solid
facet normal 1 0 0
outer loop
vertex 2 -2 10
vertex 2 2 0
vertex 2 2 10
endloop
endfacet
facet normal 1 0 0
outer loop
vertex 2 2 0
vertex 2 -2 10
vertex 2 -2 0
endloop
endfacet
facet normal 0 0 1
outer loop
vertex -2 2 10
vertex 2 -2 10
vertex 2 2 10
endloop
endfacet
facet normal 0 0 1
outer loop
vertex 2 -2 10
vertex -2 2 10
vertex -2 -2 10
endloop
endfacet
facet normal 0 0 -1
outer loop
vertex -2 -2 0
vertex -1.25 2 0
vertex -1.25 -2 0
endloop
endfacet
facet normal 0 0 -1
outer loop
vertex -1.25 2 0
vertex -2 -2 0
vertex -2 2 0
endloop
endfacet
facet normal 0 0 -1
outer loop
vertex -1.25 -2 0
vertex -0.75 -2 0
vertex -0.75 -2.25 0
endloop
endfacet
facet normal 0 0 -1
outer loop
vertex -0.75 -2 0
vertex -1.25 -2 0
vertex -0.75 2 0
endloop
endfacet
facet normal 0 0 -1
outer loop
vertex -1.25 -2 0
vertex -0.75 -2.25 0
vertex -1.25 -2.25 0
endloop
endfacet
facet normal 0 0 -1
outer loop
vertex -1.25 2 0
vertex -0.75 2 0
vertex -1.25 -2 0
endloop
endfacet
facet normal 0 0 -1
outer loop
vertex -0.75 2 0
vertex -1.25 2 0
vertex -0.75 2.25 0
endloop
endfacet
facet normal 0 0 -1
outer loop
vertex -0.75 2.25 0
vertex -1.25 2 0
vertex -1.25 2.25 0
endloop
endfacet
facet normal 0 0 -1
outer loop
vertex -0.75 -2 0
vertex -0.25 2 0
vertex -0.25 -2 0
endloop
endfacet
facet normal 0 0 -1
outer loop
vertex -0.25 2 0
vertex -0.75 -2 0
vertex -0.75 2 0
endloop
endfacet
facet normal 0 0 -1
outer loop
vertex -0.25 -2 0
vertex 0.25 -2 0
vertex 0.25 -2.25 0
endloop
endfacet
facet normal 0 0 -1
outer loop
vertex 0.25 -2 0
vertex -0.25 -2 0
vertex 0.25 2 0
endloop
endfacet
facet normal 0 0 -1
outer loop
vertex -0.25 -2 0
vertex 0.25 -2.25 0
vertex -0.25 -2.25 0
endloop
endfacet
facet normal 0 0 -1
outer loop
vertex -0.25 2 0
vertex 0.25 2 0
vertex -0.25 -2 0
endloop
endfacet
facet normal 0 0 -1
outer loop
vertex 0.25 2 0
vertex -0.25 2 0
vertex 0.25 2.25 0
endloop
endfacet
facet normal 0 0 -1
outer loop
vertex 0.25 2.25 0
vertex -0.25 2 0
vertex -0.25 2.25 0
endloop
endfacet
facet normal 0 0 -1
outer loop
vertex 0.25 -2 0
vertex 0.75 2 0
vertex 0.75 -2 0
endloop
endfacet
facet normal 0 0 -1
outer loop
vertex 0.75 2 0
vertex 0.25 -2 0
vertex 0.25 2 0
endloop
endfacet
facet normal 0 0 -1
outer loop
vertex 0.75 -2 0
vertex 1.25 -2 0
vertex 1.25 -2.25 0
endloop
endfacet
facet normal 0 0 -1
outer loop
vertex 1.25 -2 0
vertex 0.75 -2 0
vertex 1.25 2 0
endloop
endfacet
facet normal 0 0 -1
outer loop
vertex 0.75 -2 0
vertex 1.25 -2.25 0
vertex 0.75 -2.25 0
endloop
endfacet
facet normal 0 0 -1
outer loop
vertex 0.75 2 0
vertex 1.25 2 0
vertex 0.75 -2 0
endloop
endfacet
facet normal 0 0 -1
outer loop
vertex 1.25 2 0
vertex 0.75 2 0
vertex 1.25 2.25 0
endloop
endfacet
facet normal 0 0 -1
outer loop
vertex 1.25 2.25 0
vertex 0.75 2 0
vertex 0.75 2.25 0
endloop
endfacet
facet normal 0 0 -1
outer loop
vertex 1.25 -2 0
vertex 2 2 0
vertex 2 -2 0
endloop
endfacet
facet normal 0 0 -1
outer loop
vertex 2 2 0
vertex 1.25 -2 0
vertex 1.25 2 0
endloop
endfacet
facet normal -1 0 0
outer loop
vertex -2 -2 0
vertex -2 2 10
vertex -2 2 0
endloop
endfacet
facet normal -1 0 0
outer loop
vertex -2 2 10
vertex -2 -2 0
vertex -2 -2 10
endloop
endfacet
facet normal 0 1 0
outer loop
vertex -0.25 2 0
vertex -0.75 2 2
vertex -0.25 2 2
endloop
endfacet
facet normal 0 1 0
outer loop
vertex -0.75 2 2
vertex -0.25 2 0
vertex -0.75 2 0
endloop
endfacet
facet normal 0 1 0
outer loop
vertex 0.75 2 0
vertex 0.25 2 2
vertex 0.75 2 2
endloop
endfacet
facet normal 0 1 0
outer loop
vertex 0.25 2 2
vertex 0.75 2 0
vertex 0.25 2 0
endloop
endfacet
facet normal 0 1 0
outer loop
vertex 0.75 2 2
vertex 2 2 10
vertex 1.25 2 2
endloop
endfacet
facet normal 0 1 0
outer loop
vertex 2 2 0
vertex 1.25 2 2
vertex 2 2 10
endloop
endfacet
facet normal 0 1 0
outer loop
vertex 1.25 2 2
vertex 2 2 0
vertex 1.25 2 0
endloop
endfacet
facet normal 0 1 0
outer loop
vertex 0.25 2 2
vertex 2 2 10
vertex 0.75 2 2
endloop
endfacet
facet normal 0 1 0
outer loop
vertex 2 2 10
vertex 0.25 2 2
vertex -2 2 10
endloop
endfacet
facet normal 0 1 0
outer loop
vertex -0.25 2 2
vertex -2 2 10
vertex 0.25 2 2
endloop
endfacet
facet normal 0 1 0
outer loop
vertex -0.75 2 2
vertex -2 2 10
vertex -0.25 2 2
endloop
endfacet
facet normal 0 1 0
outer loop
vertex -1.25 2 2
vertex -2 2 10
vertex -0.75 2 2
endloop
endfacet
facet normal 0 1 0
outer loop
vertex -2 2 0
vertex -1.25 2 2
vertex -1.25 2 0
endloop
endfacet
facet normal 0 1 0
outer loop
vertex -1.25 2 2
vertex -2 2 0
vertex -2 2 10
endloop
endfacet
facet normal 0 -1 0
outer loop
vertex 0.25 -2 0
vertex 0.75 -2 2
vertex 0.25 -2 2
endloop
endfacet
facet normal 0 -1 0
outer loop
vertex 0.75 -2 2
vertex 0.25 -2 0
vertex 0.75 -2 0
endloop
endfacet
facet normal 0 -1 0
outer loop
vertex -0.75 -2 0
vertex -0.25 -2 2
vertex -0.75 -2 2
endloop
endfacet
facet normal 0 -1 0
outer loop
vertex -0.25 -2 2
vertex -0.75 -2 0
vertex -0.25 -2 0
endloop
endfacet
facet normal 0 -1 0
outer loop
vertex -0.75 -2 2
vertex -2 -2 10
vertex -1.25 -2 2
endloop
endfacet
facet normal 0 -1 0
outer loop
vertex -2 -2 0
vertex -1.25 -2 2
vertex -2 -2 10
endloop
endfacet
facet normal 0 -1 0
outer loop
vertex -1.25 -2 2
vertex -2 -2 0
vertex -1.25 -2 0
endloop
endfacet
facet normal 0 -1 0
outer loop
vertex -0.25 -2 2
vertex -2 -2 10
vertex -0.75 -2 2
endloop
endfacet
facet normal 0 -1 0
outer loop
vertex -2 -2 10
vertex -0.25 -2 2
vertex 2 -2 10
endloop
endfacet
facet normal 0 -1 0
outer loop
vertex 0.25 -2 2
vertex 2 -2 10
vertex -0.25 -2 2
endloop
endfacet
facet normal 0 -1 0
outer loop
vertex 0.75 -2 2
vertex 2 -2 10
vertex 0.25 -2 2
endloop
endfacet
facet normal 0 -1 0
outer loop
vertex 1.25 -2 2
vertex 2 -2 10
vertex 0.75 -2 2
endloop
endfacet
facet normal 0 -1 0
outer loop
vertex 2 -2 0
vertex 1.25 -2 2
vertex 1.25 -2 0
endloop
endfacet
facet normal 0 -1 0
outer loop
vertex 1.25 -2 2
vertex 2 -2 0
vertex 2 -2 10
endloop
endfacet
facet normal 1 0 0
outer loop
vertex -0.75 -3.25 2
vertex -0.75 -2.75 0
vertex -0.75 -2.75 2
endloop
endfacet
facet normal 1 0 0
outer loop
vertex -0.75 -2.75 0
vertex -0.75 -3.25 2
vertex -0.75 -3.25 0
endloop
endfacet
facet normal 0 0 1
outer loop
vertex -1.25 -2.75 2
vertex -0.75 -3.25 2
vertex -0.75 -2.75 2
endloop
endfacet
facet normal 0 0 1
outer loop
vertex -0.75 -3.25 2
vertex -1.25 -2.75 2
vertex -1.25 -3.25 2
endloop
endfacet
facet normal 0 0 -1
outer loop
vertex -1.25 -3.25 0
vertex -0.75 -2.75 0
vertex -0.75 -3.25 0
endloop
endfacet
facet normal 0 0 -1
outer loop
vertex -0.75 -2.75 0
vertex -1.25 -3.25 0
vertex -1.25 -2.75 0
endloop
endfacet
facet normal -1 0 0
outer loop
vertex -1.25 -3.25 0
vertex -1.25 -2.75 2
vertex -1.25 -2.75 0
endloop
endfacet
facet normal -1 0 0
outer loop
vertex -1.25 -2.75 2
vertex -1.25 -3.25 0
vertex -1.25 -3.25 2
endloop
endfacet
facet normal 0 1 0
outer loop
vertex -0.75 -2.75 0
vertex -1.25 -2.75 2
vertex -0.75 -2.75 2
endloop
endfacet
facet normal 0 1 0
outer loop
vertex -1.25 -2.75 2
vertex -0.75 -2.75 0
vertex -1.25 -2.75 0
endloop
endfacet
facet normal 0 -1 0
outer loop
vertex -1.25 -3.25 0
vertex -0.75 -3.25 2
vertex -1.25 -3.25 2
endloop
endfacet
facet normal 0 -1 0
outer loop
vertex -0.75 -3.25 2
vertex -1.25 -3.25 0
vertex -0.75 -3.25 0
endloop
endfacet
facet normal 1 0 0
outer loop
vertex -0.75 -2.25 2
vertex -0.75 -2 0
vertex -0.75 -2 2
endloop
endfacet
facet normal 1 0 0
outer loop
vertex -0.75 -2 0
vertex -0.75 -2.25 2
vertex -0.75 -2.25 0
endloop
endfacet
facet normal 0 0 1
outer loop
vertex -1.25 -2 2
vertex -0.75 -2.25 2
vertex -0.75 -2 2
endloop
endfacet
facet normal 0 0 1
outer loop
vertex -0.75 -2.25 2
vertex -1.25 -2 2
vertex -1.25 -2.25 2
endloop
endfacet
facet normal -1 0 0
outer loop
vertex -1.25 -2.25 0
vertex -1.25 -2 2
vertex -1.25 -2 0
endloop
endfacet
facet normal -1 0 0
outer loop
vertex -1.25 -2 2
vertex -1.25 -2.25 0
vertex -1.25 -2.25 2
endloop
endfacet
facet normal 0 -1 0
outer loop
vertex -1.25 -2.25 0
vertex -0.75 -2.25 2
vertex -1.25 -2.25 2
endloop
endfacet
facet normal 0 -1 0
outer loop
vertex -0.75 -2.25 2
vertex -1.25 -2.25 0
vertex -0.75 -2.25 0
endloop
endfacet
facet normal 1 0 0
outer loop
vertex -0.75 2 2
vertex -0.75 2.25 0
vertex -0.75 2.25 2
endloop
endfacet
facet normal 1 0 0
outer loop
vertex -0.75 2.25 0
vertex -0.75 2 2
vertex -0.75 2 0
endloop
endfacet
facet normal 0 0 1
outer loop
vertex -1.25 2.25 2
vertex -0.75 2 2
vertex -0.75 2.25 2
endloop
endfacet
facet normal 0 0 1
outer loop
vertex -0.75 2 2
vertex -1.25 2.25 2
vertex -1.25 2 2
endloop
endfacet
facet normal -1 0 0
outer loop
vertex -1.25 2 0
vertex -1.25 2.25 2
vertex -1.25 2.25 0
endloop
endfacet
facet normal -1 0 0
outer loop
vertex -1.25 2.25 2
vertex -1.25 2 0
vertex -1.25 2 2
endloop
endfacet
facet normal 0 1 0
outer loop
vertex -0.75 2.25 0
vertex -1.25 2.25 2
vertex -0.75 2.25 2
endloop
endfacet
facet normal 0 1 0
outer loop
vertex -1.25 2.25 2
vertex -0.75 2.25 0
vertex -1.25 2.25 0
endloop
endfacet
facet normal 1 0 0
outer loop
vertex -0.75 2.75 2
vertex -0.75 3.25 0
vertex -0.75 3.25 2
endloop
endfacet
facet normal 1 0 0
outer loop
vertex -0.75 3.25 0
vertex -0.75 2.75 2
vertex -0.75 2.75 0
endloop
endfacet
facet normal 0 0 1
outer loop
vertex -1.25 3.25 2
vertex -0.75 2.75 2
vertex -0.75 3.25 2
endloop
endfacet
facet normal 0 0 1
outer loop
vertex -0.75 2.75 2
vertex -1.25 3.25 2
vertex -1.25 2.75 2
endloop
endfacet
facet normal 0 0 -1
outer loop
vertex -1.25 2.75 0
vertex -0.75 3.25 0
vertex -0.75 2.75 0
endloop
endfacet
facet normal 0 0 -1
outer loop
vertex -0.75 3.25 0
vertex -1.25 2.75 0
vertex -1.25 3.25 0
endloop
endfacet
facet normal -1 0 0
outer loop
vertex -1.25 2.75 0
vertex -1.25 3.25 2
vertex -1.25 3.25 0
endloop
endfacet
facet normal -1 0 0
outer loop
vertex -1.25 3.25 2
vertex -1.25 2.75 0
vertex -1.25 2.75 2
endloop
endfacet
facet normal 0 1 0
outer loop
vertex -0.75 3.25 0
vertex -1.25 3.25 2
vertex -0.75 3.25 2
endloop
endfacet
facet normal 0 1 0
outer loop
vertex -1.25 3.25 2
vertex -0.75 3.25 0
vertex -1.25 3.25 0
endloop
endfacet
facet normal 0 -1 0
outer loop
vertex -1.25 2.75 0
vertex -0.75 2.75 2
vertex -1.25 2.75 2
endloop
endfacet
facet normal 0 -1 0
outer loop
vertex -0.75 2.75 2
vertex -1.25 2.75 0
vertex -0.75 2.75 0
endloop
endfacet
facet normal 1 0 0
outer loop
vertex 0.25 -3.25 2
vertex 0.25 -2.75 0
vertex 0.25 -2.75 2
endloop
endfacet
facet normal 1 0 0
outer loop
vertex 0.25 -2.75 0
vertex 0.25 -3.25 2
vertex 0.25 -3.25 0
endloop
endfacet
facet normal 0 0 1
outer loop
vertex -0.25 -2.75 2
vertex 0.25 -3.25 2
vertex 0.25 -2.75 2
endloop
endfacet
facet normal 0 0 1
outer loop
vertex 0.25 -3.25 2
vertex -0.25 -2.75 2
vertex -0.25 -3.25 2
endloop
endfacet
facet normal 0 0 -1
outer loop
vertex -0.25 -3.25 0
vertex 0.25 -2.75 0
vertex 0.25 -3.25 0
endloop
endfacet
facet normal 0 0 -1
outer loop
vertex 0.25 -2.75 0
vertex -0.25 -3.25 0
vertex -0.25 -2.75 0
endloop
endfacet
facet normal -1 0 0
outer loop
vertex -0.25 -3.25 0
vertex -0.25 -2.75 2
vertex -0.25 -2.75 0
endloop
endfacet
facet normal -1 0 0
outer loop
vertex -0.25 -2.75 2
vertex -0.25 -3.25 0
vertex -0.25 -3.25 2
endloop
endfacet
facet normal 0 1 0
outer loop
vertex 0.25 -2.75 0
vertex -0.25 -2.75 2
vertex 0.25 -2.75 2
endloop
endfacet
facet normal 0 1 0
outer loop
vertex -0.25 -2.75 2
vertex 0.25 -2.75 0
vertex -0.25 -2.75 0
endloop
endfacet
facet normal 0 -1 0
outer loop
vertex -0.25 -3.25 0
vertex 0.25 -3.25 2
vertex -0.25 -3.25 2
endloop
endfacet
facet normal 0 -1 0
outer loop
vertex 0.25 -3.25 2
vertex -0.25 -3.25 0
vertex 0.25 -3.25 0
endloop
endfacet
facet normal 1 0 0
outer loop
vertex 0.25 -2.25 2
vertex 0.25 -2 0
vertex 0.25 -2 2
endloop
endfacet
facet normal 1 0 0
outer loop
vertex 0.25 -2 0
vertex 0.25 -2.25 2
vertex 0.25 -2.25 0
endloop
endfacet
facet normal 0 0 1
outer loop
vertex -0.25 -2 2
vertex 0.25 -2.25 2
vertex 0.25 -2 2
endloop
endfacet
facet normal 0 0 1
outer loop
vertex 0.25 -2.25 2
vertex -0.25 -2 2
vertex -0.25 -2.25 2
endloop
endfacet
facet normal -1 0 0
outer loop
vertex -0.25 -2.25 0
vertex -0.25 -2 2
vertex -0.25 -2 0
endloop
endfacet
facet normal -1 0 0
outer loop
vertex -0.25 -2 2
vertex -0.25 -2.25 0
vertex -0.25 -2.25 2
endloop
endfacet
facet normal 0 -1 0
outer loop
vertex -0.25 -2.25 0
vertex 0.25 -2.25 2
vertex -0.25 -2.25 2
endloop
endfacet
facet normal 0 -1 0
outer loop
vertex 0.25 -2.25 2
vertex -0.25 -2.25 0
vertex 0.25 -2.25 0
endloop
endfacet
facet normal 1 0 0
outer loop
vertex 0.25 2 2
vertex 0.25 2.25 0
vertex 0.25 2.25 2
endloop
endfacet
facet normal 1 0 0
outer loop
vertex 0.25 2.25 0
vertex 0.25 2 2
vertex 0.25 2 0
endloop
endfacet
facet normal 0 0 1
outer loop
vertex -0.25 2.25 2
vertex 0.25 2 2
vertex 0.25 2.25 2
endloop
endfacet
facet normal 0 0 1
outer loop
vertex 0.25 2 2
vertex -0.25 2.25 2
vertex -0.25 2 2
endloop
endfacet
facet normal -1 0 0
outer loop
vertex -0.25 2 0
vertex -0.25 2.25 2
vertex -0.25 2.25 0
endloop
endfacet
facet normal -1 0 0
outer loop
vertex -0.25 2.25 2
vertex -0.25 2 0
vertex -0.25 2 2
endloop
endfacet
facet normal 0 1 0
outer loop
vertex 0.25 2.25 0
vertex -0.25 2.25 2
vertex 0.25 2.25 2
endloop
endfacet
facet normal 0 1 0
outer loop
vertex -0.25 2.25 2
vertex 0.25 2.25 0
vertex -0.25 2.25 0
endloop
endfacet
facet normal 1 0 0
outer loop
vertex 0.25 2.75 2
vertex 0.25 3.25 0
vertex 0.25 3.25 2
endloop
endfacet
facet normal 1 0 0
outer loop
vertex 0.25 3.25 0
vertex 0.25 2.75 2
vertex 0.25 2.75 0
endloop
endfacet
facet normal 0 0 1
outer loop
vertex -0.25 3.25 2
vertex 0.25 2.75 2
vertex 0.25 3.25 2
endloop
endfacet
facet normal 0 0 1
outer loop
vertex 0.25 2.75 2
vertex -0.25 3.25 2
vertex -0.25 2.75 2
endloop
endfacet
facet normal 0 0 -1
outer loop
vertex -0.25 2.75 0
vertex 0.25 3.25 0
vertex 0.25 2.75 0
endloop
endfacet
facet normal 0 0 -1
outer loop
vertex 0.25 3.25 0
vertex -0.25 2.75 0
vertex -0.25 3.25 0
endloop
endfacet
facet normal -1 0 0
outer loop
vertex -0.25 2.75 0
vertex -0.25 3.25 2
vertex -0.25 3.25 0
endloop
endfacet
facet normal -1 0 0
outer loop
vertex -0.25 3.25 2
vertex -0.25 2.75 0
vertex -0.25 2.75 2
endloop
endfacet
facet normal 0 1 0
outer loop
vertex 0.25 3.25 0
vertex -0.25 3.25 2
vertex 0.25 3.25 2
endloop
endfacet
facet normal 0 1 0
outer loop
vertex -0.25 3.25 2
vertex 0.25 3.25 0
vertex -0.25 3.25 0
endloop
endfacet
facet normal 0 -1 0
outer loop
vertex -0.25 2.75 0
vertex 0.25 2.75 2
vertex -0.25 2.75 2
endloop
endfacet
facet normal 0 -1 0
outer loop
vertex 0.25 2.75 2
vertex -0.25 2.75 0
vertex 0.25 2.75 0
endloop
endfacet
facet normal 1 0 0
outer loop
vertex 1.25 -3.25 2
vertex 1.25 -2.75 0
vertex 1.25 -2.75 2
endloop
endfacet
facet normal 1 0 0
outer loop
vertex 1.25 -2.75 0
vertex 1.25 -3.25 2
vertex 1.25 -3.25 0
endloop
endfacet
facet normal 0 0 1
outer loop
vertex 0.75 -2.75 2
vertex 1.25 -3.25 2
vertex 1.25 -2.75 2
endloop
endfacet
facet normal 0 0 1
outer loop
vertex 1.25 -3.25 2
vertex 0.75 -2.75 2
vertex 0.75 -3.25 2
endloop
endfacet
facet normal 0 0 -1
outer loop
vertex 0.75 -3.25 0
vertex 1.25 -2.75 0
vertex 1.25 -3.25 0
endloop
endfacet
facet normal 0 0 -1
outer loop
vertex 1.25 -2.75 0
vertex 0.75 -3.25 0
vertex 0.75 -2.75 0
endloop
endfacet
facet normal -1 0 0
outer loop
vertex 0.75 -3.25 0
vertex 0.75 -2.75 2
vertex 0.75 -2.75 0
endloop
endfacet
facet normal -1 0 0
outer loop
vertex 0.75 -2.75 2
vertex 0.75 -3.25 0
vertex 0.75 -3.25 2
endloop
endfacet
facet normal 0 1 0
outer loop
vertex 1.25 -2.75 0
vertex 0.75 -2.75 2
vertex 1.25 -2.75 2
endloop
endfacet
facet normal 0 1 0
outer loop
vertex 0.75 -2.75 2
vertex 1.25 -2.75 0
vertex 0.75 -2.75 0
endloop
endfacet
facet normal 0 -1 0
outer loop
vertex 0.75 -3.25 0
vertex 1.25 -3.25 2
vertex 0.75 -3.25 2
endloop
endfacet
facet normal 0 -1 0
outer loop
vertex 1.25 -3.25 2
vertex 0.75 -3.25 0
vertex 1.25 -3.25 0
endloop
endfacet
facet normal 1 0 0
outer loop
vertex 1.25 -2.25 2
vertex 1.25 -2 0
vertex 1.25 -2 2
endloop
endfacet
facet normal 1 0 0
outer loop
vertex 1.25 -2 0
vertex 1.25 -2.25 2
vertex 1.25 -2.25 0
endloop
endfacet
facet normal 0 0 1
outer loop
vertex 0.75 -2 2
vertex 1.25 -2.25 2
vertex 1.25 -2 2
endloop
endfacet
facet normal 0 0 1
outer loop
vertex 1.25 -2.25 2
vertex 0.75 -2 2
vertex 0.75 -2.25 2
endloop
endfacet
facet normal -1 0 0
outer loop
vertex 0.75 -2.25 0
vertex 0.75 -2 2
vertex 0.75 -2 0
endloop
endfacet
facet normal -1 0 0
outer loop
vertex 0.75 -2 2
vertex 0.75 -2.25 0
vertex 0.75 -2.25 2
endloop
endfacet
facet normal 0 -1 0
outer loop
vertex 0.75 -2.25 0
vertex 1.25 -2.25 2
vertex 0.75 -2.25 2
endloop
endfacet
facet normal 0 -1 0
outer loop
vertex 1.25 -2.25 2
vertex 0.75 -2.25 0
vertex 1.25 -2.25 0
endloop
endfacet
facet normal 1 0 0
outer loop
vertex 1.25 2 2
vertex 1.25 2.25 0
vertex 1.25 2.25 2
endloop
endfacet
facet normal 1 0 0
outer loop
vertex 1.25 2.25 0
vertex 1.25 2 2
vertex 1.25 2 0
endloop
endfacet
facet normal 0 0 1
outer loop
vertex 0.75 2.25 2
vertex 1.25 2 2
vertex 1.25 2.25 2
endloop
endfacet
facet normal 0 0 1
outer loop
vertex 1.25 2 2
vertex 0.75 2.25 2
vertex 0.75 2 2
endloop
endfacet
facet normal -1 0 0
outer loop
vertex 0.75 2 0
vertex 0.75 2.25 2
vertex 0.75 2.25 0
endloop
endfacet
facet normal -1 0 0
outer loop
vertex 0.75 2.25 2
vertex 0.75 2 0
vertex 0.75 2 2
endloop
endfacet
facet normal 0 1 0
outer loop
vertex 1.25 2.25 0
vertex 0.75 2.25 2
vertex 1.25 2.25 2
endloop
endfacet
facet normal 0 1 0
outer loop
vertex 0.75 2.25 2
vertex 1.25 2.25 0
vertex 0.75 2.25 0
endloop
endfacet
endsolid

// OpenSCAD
translate([0, 0, 5]) color([0,1,0,0.9]) cube([4, 4, 10], center=true);
translate([-1, -3, 1]) color([1,0,0]) cube([0.5, 0.5, 2], center=true);
translate([-1, -2, 1]) color([1,0,0]) cube([0.5, 0.5, 2], center=true);
translate([-1, -1, 1]) color([1,0,0]) cube([0.5, 0.5, 2], center=true);
translate([-1, 0, 1]) color([1,0,0]) cube([0.5, 0.5, 2], center=true);
translate([-1, 1, 1]) color([1,0,0]) cube([0.5, 0.5, 2], center=true);
translate([-1, 2, 1]) color([1,0,0]) cube([0.5, 0.5, 2], center=true);
translate([-1, 3, 1]) color([1,0,0]) cube([0.5, 0.5, 2], center=true);
translate([0, -3, 1]) color([1,0,0]) cube([0.5, 0.5, 2], center=true);
translate([0, -2, 1]) color([1,0,0]) cube([0.5, 0.5, 2], center=true);
translate([0, -1, 1]) color([1,0,0]) cube([0.5, 0.5, 2], center=true);
translate([0, 0, 1]) color([1,0,0]) cube([0.5, 0.5, 2], center=true);
translate([0, 1, 1]) color([1,0,0]) cube([0.5, 0.5, 2], center=true);
translate([0, 2, 1]) color([1,0,0]) cube([0.5, 0.5, 2], center=true);
translate([0, 3, 1]) color([1,0,0]) cube([0.5, 0.5, 2], center=true);
translate([1, -3, 1]) color([1,0,0]) cube([0.5, 0.5, 2], center=true);
translate([1, -2, 1]) color([1,0,0]) cube([0.5, 0.5, 2], center=true);
translate([1, -1, 1]) color([1,0,0]) cube([0.5, 0.5, 2], center=true);
translate([1, 0, 1]) color([1,0,0]) cube([0.5, 0.5, 2], center=true);
translate([1, 1, 1]) color([1,0,0]) cube([0.5, 0.5, 2], center=true);
translate([1, 2, 1]) color([1,0,0]) cube([0.5, 0.5, 2], center=true);
